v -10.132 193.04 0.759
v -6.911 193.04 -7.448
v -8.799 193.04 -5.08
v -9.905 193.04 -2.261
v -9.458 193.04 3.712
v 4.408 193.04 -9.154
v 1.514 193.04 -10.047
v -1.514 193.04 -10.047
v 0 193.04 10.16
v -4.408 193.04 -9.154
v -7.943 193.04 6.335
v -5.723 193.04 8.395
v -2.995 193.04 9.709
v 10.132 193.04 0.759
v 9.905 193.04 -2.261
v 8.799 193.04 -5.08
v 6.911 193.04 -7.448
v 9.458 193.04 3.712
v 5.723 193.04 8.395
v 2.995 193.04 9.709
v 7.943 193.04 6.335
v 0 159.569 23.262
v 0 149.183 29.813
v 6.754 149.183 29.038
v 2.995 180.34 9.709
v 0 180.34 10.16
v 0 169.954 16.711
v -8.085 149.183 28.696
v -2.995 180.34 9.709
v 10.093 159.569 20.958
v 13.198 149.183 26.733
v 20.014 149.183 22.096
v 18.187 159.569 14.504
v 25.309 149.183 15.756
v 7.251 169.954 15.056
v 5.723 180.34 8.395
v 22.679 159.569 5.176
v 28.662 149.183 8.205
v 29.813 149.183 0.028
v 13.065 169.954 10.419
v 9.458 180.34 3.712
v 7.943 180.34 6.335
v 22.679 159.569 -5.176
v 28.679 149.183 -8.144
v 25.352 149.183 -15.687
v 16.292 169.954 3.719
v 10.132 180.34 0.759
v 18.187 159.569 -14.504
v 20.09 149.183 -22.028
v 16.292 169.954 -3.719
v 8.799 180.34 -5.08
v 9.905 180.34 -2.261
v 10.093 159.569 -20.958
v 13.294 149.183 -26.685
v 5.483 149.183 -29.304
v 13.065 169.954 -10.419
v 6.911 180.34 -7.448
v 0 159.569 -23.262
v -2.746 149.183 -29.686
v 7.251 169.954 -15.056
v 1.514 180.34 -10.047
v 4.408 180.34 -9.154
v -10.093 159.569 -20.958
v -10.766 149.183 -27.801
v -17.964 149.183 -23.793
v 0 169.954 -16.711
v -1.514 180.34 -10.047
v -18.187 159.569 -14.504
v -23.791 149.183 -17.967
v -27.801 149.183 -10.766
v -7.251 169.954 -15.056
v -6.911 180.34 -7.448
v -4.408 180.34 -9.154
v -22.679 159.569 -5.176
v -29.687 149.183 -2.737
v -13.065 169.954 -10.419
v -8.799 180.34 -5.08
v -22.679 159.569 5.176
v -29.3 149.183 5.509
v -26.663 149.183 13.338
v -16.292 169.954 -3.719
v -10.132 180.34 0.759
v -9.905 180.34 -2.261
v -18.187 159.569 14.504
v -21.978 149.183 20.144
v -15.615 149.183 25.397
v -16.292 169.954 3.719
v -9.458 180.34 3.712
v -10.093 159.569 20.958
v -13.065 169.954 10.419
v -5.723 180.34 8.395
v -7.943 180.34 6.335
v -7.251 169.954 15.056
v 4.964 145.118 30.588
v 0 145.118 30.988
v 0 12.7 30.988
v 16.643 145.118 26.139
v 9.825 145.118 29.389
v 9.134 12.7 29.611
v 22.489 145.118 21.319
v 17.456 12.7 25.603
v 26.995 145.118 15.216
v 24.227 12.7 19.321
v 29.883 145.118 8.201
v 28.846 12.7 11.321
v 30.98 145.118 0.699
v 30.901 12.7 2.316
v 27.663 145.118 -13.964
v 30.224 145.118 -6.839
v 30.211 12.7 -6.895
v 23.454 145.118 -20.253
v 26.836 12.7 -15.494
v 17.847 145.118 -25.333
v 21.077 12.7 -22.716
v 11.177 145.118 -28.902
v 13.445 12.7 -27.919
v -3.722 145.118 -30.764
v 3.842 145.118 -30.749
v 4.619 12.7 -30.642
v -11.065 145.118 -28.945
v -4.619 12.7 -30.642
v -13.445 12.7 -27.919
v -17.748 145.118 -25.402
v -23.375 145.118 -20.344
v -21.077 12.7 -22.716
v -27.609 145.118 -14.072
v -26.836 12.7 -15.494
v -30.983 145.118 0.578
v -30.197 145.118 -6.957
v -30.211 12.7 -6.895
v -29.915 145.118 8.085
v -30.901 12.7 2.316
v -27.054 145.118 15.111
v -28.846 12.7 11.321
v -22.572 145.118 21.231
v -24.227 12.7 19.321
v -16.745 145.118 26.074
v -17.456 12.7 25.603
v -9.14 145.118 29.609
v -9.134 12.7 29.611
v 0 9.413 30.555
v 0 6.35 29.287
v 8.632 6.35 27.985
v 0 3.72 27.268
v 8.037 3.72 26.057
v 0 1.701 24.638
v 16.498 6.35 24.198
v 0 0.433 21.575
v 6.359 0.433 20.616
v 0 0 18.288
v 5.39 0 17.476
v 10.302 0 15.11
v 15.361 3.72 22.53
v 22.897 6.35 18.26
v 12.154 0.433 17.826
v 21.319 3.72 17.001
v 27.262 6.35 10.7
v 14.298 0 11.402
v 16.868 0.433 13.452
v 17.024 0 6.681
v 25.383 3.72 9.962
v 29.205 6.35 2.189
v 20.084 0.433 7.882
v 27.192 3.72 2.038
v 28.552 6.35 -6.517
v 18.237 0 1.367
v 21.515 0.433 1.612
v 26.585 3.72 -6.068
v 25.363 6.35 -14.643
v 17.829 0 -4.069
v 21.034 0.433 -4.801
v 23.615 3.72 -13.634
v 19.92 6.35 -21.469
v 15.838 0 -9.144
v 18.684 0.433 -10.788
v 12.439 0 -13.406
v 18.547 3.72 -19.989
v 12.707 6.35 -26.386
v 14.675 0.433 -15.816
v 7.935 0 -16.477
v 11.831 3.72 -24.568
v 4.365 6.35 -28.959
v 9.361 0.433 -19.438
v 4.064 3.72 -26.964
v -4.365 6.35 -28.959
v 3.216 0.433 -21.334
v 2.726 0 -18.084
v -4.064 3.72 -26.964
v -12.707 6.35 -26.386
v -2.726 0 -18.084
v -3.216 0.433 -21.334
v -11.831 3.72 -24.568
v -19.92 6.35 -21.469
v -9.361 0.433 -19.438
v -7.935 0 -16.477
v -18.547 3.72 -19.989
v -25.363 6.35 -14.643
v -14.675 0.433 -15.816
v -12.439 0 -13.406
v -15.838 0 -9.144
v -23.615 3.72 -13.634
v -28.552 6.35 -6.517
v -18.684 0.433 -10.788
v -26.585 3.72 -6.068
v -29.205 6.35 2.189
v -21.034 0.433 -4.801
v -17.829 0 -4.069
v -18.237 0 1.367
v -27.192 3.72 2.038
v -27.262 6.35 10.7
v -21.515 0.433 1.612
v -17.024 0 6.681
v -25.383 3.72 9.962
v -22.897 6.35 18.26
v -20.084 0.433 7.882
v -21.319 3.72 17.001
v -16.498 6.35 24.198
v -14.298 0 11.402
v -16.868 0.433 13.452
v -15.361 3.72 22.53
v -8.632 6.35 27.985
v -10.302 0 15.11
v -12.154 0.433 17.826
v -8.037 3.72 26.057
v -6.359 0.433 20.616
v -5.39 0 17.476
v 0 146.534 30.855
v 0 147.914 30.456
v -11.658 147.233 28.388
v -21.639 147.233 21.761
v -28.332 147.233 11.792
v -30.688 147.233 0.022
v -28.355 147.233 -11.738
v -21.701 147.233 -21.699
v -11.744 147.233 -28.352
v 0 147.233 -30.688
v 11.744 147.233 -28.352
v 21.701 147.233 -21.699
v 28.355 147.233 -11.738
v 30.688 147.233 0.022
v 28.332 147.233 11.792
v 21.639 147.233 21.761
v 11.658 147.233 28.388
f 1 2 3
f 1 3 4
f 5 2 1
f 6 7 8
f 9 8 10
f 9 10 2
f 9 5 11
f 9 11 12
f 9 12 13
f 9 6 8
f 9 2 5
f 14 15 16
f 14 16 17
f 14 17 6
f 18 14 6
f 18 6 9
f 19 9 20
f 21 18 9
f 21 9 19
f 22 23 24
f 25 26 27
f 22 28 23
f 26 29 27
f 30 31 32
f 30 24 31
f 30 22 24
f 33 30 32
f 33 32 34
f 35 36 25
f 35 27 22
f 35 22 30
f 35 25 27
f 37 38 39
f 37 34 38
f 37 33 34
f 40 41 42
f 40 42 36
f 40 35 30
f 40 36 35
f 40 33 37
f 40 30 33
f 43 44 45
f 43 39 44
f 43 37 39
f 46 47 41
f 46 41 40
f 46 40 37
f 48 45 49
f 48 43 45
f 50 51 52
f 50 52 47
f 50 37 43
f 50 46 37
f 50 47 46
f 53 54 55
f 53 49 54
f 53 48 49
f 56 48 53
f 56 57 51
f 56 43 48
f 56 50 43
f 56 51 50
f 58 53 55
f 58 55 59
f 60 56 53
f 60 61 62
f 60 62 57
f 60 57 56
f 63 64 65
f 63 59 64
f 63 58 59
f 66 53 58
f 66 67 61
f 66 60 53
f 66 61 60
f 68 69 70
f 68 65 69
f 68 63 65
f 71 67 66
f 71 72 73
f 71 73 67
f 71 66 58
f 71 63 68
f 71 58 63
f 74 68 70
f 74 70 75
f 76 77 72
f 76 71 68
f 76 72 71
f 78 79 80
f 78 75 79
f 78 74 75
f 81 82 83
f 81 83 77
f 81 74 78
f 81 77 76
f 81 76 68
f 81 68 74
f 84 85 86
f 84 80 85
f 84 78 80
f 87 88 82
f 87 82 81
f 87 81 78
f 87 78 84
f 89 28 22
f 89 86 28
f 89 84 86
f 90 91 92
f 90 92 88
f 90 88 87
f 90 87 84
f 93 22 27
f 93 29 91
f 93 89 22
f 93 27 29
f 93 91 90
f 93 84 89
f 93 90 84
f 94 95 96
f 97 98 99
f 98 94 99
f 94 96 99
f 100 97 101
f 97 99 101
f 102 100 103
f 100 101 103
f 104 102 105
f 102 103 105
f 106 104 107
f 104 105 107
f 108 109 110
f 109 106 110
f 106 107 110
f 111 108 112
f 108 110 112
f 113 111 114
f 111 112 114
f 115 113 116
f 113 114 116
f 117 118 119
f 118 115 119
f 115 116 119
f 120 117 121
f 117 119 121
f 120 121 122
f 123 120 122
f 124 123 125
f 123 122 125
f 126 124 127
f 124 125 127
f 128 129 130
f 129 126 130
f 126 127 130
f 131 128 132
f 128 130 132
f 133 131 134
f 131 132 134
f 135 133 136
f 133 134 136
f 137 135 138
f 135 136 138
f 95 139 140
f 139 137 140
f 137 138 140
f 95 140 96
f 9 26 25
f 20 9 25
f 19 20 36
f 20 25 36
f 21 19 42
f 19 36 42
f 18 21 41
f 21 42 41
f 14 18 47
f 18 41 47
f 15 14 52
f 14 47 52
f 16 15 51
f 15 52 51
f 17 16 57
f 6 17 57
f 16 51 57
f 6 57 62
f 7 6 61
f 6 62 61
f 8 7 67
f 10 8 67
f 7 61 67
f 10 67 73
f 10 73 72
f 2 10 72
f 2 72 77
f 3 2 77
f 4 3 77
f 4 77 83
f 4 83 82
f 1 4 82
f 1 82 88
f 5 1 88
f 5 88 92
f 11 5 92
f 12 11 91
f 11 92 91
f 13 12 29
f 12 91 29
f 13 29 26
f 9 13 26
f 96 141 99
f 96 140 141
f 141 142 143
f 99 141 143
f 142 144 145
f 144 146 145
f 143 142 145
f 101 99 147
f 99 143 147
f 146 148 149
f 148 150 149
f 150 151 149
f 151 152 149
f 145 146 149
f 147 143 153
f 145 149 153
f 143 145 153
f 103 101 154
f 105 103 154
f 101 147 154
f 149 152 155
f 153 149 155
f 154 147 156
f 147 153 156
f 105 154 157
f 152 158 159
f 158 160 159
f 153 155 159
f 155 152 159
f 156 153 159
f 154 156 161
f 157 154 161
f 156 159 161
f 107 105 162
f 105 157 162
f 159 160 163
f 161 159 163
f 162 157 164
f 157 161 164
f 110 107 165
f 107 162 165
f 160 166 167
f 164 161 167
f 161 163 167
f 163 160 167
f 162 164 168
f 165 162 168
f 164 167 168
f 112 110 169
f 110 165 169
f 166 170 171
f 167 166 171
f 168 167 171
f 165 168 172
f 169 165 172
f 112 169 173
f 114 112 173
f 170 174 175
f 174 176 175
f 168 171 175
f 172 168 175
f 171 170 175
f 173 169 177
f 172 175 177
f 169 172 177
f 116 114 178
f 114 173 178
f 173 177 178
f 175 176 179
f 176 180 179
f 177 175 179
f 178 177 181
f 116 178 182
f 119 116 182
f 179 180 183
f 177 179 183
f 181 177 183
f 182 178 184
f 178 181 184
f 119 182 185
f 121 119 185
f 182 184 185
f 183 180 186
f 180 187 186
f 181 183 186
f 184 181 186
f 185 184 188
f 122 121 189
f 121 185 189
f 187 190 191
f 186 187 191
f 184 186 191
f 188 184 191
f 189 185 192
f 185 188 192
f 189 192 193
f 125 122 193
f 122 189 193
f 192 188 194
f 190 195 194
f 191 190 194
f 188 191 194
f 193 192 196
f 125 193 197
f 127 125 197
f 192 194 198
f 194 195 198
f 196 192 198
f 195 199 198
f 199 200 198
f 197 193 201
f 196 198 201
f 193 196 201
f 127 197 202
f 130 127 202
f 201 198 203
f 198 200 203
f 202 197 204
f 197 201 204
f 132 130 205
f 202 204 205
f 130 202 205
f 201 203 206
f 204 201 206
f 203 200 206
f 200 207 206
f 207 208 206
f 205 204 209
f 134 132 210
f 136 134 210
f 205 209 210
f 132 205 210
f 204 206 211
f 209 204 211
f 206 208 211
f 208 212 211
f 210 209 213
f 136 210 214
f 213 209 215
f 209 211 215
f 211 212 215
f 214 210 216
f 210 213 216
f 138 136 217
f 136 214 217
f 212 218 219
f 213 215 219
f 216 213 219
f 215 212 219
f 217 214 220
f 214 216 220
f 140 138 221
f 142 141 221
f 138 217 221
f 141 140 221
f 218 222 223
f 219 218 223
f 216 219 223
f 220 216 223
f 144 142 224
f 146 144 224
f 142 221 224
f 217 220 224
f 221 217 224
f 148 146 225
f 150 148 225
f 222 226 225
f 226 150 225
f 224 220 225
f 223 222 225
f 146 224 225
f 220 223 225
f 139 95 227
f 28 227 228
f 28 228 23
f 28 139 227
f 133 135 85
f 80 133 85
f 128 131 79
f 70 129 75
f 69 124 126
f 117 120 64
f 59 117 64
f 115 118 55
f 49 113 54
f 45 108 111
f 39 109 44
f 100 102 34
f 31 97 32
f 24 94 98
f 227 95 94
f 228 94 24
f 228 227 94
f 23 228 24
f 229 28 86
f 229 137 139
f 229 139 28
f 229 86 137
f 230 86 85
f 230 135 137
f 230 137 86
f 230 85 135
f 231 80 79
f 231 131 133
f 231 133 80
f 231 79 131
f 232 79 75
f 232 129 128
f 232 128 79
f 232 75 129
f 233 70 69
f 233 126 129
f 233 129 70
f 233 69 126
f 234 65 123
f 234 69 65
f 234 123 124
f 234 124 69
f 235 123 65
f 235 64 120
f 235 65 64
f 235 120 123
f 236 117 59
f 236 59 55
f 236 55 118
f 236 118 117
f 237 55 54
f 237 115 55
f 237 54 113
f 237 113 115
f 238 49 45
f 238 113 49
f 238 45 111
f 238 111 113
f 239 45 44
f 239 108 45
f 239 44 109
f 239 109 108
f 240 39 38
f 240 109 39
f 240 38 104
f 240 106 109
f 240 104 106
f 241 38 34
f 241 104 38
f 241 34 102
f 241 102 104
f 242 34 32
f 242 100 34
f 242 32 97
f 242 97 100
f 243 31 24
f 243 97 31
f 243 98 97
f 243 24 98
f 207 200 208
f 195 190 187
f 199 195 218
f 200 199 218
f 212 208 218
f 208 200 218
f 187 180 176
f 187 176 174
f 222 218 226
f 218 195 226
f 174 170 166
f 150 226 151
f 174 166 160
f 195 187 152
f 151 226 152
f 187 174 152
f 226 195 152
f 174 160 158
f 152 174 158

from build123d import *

# Parameters (mm, degrees)
SKETCH1_R           = 30.988
BOSS_EXTRUDE1_DEPTH = 147.32
SKETCH3_R           = 10.16
FILLET3_R           = 7.62
SKETCH8_R           = 10.16
BOSS_EXTRUDE2_DEPTH = 12.7
FILLET4_R           = 12.7


with BuildPart() as part:
    # Sketch1 → Boss-Extrude1 (new body)
    with BuildSketch(Plane(origin=(0, 0, 0), x_dir=(1, 0, 0), z_dir=(0, 1, 0))):
        with Locations(Location((0, 0, 0), (0, 0, 270))):
            Circle(SKETCH1_R)
    extrude(amount=BOSS_EXTRUDE1_DEPTH)

    # Sketch3 → section 1 of loft2
    with BuildSketch(Plane(origin=(0, 180.34, 0), x_dir=(-1, 0, 0), z_dir=(0, -1, 0)), mode=Mode.PRIVATE) as loft2_s1:
        Circle(SKETCH3_R)
    # loft up to a face of the part (loft2)
    loft([Face(Wire([part.edges().sort_by_distance((22.589279827, 147.32, -21.212745719))[0]])), loft2_s1.sketch])

    # Fillet3
    fillet3_edges = [part.edges().sort_by_distance(p)[0] for p in [
        (0, 147.32, -30.988),
    ]]
    fillet(fillet3_edges, radius=FILLET3_R)

    # Sketch8 → Boss-Extrude2 (add)
    with BuildSketch(Plane(origin=(0, 180.34, 0), x_dir=(1, 0, 0), z_dir=(0, 1, 0))):
        with Locations(Location((0, 0, 0), (0, 0, 270))):
            Circle(SKETCH8_R)
    extrude(amount=BOSS_EXTRUDE2_DEPTH)

    # Fillet4
    fillet4_edges = [part.edges().sort_by_distance(p)[0] for p in [
        (0, 0, -30.988),
    ]]
    fillet(fillet4_edges, radius=FILLET4_R)


solid = part.part
